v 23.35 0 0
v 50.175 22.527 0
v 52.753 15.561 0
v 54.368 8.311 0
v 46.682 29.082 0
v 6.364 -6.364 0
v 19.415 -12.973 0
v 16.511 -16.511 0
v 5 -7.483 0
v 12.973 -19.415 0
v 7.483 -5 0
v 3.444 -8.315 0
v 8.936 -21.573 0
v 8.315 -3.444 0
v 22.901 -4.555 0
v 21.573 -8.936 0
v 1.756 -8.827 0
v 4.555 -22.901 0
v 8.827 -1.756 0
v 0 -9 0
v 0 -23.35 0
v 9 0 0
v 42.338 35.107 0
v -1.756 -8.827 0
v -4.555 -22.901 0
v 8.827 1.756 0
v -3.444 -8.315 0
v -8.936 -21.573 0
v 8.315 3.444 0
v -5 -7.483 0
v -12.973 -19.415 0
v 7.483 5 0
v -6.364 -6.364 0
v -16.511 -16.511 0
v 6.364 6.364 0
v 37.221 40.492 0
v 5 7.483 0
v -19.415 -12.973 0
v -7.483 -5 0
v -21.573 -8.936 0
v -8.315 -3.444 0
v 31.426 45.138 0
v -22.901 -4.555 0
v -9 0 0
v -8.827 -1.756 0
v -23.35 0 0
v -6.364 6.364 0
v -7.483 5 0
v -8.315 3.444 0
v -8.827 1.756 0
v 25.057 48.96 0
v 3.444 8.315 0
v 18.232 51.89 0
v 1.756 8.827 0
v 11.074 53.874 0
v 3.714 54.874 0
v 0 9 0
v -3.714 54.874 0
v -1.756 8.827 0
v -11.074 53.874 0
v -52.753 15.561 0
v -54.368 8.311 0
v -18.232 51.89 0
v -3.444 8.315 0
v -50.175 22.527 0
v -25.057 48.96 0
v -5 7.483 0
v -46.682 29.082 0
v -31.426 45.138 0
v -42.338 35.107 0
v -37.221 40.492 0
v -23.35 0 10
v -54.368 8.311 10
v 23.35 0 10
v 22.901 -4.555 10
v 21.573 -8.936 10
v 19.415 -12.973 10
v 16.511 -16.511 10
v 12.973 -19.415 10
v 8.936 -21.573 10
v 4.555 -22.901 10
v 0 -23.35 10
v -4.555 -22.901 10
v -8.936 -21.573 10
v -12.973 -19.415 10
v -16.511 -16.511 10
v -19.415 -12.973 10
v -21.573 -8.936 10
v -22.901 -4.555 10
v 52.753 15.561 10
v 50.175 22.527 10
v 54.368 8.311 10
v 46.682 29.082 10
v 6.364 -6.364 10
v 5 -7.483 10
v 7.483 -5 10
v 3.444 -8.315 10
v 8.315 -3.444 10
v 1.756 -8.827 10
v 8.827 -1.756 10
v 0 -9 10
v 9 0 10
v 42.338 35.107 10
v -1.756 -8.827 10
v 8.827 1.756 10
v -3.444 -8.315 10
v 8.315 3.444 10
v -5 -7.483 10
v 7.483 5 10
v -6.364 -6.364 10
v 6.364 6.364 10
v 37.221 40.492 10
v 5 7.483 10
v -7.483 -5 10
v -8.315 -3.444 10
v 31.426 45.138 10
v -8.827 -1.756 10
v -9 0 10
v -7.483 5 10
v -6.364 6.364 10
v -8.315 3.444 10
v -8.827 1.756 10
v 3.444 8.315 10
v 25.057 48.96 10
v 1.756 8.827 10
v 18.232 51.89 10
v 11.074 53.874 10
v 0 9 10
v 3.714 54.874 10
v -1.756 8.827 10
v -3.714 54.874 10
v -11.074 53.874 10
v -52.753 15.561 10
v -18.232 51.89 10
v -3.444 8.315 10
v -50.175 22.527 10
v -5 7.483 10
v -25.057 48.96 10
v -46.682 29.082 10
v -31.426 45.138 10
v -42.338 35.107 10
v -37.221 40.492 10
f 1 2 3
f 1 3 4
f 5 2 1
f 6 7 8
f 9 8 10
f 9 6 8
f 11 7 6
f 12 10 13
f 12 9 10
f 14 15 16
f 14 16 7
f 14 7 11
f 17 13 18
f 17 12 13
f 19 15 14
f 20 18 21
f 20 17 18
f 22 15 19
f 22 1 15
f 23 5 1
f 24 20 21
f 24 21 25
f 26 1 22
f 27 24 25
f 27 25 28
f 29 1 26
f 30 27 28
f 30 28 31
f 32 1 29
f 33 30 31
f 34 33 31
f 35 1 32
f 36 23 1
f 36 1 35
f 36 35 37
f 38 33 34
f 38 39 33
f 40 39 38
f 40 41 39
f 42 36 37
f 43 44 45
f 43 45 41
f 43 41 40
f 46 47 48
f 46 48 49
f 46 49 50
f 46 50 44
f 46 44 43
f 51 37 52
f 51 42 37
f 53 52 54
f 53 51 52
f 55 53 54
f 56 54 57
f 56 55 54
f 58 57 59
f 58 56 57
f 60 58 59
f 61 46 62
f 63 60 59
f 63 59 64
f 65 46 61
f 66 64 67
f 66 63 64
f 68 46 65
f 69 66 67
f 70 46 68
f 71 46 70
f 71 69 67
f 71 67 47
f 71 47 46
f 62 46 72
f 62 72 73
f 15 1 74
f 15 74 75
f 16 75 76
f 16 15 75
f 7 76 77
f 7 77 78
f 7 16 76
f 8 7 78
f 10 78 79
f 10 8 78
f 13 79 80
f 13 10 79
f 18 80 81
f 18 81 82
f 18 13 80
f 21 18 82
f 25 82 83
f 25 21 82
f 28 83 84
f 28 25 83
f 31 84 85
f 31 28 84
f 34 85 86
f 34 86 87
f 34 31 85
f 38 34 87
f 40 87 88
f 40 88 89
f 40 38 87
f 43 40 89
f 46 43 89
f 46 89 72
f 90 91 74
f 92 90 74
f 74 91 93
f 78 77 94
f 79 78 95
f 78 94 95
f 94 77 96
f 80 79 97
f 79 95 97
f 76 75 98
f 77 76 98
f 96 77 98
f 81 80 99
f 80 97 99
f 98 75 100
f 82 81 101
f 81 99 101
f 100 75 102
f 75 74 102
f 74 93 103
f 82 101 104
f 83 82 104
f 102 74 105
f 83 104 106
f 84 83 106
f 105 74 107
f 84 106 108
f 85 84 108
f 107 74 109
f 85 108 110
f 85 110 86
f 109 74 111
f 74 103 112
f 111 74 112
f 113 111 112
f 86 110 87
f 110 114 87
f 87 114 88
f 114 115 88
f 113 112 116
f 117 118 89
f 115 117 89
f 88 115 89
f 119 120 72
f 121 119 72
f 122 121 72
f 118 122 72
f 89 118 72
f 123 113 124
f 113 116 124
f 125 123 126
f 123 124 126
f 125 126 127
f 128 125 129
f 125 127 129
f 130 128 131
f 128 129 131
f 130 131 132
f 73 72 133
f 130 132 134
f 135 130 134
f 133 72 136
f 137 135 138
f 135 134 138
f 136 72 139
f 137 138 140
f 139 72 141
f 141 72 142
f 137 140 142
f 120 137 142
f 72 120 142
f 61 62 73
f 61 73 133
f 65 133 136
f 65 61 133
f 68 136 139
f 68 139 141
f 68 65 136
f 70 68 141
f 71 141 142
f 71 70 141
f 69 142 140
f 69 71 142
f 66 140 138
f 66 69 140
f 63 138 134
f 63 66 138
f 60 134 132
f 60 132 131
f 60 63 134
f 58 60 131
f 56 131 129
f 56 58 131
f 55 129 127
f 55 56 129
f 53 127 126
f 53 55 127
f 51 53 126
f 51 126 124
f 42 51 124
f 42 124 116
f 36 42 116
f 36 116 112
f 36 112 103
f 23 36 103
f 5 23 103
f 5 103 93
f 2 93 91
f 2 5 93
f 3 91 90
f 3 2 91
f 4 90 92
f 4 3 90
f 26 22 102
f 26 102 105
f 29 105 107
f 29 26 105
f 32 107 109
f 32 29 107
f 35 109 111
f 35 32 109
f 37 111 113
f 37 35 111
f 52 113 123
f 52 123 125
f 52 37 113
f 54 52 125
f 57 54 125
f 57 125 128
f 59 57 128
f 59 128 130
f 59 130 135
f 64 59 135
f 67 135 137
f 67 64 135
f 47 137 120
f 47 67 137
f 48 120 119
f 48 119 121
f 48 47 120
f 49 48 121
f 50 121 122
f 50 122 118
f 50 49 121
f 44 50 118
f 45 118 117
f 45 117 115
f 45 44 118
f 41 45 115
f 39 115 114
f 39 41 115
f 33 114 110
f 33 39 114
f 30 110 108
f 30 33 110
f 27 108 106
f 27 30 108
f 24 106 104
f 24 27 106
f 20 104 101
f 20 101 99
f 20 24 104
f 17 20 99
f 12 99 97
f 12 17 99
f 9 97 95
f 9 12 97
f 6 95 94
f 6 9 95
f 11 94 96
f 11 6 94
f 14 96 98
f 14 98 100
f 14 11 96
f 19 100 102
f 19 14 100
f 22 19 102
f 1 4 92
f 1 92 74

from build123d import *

# Parameters (mm, degrees)
SZKIC1_R                    = 9
DODANIE_WYCI_GNI_CIE1_DEPTH = 10


with BuildPart() as part:
    # Szkic1 → Dodanie-wyciągnięcie1 (new body)
    with BuildSketch(Plane.XY):
        with BuildLine():
            Line((-23.35, 0), (-54.368386356, 8.311351575))
            ThreePointArc((-54.368386356, 8.311351575), (0, 55), (54.368386356, 8.311351575))
            Line((54.368386356, 8.311351575), (23.35, 0))
            ThreePointArc((23.35, 0), (0, -23.35), (-23.35, 0))
        make_face()
        Circle(SZKIC1_R, mode=Mode.SUBTRACT)
    extrude(amount=DODANIE_WYCI_GNI_CIE1_DEPTH)


solid = part.part
